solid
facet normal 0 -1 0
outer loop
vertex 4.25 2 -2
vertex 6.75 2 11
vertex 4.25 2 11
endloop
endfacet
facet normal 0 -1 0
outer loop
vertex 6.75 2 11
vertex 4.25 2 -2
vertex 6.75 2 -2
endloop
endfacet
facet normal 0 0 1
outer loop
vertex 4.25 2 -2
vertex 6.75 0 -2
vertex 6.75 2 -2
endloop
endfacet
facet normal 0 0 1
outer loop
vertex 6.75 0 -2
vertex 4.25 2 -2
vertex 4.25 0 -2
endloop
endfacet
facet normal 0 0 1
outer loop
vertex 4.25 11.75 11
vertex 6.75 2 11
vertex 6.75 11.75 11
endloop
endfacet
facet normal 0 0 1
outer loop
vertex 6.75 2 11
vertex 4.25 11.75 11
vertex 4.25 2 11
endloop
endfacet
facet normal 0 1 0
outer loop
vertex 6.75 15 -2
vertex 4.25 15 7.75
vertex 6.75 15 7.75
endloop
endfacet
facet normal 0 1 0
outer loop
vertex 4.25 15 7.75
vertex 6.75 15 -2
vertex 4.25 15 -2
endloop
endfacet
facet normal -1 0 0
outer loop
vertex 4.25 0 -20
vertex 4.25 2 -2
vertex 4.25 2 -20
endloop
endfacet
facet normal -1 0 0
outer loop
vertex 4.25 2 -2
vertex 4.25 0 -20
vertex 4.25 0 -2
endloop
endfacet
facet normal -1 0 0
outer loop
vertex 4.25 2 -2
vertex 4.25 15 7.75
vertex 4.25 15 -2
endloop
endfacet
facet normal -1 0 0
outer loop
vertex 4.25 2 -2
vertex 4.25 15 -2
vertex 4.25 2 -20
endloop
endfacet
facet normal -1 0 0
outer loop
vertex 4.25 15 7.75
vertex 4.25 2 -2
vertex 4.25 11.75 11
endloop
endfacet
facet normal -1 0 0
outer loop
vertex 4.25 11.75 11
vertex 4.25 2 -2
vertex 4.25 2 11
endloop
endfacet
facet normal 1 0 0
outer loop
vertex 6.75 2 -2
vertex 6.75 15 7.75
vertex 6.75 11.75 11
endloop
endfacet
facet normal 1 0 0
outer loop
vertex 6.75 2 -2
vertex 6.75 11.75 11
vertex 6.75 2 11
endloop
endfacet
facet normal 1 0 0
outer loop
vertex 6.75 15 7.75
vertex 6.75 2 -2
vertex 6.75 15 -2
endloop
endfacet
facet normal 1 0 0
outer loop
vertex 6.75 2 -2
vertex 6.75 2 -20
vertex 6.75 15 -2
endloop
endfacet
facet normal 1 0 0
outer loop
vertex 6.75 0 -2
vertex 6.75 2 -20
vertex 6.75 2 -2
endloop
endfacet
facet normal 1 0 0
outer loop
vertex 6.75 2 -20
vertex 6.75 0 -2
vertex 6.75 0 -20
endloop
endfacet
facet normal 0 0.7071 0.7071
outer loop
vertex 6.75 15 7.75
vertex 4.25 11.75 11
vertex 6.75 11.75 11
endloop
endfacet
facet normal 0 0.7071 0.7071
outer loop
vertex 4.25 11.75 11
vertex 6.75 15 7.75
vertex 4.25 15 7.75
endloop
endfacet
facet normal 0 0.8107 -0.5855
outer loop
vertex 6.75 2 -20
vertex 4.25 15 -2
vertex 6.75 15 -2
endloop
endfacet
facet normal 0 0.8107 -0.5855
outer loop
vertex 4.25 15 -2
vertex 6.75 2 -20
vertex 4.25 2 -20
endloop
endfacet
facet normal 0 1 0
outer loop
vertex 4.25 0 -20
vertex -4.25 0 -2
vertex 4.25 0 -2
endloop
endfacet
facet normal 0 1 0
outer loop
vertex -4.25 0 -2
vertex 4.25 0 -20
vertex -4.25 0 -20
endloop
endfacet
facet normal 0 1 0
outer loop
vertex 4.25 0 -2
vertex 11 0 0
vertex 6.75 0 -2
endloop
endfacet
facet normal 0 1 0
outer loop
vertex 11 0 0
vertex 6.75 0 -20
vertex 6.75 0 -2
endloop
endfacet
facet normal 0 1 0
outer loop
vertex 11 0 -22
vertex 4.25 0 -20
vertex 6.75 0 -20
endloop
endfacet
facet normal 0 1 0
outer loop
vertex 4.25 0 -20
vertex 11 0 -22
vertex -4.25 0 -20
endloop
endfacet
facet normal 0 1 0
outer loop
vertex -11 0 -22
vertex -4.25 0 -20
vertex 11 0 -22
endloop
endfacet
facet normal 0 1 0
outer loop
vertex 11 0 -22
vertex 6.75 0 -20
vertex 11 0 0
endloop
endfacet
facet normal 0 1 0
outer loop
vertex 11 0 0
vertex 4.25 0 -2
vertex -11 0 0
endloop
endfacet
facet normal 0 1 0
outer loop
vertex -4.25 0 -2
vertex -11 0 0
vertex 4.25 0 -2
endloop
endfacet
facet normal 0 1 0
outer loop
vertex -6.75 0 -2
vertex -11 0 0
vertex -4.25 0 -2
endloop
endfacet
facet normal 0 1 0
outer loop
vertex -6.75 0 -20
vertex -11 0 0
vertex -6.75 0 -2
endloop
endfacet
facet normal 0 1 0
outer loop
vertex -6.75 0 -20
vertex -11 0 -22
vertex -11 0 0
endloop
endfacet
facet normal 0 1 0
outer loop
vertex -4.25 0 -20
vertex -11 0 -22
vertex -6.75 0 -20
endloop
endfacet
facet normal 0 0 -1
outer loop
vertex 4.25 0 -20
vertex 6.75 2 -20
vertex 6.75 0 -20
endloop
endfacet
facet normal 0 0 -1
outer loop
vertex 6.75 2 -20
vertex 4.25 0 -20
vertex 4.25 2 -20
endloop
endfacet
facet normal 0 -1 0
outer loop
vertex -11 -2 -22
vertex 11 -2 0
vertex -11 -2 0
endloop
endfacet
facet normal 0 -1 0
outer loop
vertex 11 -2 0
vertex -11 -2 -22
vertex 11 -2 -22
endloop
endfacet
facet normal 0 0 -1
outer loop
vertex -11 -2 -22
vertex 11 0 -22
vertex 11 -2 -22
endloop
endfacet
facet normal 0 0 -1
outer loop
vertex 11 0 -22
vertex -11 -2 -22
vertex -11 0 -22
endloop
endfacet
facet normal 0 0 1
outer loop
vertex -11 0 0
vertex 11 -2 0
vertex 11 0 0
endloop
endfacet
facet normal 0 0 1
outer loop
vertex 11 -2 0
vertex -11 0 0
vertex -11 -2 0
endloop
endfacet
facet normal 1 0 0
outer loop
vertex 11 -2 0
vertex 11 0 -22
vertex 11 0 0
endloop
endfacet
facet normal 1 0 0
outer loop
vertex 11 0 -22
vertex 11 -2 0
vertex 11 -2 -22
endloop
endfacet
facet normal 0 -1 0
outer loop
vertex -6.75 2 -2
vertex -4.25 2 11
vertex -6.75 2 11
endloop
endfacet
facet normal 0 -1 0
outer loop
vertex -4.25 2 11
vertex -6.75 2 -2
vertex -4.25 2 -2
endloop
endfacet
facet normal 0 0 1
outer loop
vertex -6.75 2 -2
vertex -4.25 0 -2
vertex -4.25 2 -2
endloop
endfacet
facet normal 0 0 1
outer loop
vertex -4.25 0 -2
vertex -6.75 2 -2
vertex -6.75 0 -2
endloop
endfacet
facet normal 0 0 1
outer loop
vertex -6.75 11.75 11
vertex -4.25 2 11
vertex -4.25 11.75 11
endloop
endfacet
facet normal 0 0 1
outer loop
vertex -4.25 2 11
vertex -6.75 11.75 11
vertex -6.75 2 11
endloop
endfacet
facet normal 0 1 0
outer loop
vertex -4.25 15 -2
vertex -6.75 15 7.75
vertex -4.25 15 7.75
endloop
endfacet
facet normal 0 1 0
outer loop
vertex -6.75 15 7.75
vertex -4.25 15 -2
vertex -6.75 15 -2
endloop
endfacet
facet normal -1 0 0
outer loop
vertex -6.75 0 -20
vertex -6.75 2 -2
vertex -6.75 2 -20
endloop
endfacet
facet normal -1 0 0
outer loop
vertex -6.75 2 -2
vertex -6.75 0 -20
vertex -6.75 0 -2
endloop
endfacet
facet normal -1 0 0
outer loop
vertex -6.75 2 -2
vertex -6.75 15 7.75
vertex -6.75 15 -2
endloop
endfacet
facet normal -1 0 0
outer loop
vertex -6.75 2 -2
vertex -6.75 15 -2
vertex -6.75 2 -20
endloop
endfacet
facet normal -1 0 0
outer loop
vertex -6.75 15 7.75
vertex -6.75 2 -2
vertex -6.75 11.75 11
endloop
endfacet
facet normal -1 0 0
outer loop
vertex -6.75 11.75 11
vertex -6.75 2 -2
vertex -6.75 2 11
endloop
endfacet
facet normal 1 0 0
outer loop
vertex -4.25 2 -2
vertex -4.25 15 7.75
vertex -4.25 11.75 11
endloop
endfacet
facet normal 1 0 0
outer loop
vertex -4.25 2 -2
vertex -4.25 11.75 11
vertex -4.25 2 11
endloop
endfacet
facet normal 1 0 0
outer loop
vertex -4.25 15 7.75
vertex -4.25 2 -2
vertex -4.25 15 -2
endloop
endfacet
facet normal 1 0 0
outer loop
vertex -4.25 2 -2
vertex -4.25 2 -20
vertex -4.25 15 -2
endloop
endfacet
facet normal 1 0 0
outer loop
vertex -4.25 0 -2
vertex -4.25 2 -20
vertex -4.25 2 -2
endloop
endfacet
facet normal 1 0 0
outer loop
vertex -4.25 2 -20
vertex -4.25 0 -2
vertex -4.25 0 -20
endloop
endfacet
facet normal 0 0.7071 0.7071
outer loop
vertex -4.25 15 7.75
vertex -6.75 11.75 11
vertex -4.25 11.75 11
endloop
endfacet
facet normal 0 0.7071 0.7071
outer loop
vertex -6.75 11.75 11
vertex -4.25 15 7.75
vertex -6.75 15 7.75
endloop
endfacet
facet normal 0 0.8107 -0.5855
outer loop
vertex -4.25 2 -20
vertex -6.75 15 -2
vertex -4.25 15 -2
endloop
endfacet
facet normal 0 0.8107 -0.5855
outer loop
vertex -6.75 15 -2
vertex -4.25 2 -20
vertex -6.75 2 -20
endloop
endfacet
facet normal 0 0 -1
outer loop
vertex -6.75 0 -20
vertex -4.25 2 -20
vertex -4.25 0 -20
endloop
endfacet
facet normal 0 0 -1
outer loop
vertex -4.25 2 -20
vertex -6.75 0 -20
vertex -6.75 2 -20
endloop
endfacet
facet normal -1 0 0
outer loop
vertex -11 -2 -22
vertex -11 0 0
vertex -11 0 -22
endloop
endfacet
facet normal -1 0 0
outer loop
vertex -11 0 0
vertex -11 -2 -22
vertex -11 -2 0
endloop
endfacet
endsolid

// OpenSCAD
//Creates a hook for a Standard double slot shelf track
//Coordinates are made so it should line up with the top of the thing you are adding
//   Yes the hooks needs to stick up a bit otherwise you can not put them in.



//Draw a prism based on a 
//right angled triangle
//l - length of prism
//w - width of triangle
//h - height of triangle
//From https://github.com/orionrobots/openscad_parts_library/blob/master/prism.scad
module prism(l, w, h) {
       polyhedron(points=[
               [0,0,h],           // 0    front top corner
               [0,0,0],[w,0,0],   // 1, 2 front left & right bottom corners
               [0,l,h],           // 3    back top corner
               [0,l,0],[w,l,0]    // 4, 5 back left & right bottom corners
       ], faces=[ // points for all faces must be ordered clockwise when looking in
               [0,2,1],    // top face
               [3,4,5],    // base face
               [0,1,4,3],  // h face
               [1,2,5,4],  // w face
               [0,3,5,2],  // hypotenuse face
       ]);
}
module oneslot(backwallwidth=22) {
  
  // These are numbers that make it fit, not necessarily the real numbers as measured on the track
  slotwidth=2.5;
  slotdepth=2;
  slotheight=18;  
  raildepth=13;
  backwallheight=22;
  
  dummythick=2;
  
  translate([0,slotwidth,0]) rotate(180) prism(slotwidth, raildepth, slotheight);
  cube([slotdepth,slotwidth,slotheight]);
  difference () {
    translate([-raildepth,0,-raildepth]) cube([raildepth,slotwidth,raildepth]);
    translate([-raildepth,0,-raildepth]) prism(slotwidth, raildepth/4, raildepth/4);
  }
  
  translate([slotdepth,slotwidth/2-backwallwidth/2,(slotheight-backwallheight)/2]) cube([dummythick,backwallwidth,backwallheight]);

  // Dummy wall for testing, creating a foot to easier test print. Rotate so foot is on build plate rotate([180,0,0])
  //translate([slotdepth,slotwidth/2-backwallwidth/2,backwallheight+(slotheight-backwallheight)]) cube([20,backwallwidth,dummythick]);
  

}

module twoslot(backwallwidth=22) {
  slotdepth=2;
  slotwidth=2.5;
  slotspace=11;
  backwallwidth = max(backwallwidth,11);
  translate([0,0,-slotdepth]) rotate([0,180,90]) {
    translate([-slotdepth,-slotspace/2-slotwidth/2,0])oneslot(backwallwidth);
    translate([-slotdepth,slotspace/2-slotwidth/2,0]) oneslot(backwallwidth);
  }
  echo (Slot_distance=(slotspace/2-slotwidth/2)-(-slotspace/2-slotwidth/2));
}
twoslot(11);
